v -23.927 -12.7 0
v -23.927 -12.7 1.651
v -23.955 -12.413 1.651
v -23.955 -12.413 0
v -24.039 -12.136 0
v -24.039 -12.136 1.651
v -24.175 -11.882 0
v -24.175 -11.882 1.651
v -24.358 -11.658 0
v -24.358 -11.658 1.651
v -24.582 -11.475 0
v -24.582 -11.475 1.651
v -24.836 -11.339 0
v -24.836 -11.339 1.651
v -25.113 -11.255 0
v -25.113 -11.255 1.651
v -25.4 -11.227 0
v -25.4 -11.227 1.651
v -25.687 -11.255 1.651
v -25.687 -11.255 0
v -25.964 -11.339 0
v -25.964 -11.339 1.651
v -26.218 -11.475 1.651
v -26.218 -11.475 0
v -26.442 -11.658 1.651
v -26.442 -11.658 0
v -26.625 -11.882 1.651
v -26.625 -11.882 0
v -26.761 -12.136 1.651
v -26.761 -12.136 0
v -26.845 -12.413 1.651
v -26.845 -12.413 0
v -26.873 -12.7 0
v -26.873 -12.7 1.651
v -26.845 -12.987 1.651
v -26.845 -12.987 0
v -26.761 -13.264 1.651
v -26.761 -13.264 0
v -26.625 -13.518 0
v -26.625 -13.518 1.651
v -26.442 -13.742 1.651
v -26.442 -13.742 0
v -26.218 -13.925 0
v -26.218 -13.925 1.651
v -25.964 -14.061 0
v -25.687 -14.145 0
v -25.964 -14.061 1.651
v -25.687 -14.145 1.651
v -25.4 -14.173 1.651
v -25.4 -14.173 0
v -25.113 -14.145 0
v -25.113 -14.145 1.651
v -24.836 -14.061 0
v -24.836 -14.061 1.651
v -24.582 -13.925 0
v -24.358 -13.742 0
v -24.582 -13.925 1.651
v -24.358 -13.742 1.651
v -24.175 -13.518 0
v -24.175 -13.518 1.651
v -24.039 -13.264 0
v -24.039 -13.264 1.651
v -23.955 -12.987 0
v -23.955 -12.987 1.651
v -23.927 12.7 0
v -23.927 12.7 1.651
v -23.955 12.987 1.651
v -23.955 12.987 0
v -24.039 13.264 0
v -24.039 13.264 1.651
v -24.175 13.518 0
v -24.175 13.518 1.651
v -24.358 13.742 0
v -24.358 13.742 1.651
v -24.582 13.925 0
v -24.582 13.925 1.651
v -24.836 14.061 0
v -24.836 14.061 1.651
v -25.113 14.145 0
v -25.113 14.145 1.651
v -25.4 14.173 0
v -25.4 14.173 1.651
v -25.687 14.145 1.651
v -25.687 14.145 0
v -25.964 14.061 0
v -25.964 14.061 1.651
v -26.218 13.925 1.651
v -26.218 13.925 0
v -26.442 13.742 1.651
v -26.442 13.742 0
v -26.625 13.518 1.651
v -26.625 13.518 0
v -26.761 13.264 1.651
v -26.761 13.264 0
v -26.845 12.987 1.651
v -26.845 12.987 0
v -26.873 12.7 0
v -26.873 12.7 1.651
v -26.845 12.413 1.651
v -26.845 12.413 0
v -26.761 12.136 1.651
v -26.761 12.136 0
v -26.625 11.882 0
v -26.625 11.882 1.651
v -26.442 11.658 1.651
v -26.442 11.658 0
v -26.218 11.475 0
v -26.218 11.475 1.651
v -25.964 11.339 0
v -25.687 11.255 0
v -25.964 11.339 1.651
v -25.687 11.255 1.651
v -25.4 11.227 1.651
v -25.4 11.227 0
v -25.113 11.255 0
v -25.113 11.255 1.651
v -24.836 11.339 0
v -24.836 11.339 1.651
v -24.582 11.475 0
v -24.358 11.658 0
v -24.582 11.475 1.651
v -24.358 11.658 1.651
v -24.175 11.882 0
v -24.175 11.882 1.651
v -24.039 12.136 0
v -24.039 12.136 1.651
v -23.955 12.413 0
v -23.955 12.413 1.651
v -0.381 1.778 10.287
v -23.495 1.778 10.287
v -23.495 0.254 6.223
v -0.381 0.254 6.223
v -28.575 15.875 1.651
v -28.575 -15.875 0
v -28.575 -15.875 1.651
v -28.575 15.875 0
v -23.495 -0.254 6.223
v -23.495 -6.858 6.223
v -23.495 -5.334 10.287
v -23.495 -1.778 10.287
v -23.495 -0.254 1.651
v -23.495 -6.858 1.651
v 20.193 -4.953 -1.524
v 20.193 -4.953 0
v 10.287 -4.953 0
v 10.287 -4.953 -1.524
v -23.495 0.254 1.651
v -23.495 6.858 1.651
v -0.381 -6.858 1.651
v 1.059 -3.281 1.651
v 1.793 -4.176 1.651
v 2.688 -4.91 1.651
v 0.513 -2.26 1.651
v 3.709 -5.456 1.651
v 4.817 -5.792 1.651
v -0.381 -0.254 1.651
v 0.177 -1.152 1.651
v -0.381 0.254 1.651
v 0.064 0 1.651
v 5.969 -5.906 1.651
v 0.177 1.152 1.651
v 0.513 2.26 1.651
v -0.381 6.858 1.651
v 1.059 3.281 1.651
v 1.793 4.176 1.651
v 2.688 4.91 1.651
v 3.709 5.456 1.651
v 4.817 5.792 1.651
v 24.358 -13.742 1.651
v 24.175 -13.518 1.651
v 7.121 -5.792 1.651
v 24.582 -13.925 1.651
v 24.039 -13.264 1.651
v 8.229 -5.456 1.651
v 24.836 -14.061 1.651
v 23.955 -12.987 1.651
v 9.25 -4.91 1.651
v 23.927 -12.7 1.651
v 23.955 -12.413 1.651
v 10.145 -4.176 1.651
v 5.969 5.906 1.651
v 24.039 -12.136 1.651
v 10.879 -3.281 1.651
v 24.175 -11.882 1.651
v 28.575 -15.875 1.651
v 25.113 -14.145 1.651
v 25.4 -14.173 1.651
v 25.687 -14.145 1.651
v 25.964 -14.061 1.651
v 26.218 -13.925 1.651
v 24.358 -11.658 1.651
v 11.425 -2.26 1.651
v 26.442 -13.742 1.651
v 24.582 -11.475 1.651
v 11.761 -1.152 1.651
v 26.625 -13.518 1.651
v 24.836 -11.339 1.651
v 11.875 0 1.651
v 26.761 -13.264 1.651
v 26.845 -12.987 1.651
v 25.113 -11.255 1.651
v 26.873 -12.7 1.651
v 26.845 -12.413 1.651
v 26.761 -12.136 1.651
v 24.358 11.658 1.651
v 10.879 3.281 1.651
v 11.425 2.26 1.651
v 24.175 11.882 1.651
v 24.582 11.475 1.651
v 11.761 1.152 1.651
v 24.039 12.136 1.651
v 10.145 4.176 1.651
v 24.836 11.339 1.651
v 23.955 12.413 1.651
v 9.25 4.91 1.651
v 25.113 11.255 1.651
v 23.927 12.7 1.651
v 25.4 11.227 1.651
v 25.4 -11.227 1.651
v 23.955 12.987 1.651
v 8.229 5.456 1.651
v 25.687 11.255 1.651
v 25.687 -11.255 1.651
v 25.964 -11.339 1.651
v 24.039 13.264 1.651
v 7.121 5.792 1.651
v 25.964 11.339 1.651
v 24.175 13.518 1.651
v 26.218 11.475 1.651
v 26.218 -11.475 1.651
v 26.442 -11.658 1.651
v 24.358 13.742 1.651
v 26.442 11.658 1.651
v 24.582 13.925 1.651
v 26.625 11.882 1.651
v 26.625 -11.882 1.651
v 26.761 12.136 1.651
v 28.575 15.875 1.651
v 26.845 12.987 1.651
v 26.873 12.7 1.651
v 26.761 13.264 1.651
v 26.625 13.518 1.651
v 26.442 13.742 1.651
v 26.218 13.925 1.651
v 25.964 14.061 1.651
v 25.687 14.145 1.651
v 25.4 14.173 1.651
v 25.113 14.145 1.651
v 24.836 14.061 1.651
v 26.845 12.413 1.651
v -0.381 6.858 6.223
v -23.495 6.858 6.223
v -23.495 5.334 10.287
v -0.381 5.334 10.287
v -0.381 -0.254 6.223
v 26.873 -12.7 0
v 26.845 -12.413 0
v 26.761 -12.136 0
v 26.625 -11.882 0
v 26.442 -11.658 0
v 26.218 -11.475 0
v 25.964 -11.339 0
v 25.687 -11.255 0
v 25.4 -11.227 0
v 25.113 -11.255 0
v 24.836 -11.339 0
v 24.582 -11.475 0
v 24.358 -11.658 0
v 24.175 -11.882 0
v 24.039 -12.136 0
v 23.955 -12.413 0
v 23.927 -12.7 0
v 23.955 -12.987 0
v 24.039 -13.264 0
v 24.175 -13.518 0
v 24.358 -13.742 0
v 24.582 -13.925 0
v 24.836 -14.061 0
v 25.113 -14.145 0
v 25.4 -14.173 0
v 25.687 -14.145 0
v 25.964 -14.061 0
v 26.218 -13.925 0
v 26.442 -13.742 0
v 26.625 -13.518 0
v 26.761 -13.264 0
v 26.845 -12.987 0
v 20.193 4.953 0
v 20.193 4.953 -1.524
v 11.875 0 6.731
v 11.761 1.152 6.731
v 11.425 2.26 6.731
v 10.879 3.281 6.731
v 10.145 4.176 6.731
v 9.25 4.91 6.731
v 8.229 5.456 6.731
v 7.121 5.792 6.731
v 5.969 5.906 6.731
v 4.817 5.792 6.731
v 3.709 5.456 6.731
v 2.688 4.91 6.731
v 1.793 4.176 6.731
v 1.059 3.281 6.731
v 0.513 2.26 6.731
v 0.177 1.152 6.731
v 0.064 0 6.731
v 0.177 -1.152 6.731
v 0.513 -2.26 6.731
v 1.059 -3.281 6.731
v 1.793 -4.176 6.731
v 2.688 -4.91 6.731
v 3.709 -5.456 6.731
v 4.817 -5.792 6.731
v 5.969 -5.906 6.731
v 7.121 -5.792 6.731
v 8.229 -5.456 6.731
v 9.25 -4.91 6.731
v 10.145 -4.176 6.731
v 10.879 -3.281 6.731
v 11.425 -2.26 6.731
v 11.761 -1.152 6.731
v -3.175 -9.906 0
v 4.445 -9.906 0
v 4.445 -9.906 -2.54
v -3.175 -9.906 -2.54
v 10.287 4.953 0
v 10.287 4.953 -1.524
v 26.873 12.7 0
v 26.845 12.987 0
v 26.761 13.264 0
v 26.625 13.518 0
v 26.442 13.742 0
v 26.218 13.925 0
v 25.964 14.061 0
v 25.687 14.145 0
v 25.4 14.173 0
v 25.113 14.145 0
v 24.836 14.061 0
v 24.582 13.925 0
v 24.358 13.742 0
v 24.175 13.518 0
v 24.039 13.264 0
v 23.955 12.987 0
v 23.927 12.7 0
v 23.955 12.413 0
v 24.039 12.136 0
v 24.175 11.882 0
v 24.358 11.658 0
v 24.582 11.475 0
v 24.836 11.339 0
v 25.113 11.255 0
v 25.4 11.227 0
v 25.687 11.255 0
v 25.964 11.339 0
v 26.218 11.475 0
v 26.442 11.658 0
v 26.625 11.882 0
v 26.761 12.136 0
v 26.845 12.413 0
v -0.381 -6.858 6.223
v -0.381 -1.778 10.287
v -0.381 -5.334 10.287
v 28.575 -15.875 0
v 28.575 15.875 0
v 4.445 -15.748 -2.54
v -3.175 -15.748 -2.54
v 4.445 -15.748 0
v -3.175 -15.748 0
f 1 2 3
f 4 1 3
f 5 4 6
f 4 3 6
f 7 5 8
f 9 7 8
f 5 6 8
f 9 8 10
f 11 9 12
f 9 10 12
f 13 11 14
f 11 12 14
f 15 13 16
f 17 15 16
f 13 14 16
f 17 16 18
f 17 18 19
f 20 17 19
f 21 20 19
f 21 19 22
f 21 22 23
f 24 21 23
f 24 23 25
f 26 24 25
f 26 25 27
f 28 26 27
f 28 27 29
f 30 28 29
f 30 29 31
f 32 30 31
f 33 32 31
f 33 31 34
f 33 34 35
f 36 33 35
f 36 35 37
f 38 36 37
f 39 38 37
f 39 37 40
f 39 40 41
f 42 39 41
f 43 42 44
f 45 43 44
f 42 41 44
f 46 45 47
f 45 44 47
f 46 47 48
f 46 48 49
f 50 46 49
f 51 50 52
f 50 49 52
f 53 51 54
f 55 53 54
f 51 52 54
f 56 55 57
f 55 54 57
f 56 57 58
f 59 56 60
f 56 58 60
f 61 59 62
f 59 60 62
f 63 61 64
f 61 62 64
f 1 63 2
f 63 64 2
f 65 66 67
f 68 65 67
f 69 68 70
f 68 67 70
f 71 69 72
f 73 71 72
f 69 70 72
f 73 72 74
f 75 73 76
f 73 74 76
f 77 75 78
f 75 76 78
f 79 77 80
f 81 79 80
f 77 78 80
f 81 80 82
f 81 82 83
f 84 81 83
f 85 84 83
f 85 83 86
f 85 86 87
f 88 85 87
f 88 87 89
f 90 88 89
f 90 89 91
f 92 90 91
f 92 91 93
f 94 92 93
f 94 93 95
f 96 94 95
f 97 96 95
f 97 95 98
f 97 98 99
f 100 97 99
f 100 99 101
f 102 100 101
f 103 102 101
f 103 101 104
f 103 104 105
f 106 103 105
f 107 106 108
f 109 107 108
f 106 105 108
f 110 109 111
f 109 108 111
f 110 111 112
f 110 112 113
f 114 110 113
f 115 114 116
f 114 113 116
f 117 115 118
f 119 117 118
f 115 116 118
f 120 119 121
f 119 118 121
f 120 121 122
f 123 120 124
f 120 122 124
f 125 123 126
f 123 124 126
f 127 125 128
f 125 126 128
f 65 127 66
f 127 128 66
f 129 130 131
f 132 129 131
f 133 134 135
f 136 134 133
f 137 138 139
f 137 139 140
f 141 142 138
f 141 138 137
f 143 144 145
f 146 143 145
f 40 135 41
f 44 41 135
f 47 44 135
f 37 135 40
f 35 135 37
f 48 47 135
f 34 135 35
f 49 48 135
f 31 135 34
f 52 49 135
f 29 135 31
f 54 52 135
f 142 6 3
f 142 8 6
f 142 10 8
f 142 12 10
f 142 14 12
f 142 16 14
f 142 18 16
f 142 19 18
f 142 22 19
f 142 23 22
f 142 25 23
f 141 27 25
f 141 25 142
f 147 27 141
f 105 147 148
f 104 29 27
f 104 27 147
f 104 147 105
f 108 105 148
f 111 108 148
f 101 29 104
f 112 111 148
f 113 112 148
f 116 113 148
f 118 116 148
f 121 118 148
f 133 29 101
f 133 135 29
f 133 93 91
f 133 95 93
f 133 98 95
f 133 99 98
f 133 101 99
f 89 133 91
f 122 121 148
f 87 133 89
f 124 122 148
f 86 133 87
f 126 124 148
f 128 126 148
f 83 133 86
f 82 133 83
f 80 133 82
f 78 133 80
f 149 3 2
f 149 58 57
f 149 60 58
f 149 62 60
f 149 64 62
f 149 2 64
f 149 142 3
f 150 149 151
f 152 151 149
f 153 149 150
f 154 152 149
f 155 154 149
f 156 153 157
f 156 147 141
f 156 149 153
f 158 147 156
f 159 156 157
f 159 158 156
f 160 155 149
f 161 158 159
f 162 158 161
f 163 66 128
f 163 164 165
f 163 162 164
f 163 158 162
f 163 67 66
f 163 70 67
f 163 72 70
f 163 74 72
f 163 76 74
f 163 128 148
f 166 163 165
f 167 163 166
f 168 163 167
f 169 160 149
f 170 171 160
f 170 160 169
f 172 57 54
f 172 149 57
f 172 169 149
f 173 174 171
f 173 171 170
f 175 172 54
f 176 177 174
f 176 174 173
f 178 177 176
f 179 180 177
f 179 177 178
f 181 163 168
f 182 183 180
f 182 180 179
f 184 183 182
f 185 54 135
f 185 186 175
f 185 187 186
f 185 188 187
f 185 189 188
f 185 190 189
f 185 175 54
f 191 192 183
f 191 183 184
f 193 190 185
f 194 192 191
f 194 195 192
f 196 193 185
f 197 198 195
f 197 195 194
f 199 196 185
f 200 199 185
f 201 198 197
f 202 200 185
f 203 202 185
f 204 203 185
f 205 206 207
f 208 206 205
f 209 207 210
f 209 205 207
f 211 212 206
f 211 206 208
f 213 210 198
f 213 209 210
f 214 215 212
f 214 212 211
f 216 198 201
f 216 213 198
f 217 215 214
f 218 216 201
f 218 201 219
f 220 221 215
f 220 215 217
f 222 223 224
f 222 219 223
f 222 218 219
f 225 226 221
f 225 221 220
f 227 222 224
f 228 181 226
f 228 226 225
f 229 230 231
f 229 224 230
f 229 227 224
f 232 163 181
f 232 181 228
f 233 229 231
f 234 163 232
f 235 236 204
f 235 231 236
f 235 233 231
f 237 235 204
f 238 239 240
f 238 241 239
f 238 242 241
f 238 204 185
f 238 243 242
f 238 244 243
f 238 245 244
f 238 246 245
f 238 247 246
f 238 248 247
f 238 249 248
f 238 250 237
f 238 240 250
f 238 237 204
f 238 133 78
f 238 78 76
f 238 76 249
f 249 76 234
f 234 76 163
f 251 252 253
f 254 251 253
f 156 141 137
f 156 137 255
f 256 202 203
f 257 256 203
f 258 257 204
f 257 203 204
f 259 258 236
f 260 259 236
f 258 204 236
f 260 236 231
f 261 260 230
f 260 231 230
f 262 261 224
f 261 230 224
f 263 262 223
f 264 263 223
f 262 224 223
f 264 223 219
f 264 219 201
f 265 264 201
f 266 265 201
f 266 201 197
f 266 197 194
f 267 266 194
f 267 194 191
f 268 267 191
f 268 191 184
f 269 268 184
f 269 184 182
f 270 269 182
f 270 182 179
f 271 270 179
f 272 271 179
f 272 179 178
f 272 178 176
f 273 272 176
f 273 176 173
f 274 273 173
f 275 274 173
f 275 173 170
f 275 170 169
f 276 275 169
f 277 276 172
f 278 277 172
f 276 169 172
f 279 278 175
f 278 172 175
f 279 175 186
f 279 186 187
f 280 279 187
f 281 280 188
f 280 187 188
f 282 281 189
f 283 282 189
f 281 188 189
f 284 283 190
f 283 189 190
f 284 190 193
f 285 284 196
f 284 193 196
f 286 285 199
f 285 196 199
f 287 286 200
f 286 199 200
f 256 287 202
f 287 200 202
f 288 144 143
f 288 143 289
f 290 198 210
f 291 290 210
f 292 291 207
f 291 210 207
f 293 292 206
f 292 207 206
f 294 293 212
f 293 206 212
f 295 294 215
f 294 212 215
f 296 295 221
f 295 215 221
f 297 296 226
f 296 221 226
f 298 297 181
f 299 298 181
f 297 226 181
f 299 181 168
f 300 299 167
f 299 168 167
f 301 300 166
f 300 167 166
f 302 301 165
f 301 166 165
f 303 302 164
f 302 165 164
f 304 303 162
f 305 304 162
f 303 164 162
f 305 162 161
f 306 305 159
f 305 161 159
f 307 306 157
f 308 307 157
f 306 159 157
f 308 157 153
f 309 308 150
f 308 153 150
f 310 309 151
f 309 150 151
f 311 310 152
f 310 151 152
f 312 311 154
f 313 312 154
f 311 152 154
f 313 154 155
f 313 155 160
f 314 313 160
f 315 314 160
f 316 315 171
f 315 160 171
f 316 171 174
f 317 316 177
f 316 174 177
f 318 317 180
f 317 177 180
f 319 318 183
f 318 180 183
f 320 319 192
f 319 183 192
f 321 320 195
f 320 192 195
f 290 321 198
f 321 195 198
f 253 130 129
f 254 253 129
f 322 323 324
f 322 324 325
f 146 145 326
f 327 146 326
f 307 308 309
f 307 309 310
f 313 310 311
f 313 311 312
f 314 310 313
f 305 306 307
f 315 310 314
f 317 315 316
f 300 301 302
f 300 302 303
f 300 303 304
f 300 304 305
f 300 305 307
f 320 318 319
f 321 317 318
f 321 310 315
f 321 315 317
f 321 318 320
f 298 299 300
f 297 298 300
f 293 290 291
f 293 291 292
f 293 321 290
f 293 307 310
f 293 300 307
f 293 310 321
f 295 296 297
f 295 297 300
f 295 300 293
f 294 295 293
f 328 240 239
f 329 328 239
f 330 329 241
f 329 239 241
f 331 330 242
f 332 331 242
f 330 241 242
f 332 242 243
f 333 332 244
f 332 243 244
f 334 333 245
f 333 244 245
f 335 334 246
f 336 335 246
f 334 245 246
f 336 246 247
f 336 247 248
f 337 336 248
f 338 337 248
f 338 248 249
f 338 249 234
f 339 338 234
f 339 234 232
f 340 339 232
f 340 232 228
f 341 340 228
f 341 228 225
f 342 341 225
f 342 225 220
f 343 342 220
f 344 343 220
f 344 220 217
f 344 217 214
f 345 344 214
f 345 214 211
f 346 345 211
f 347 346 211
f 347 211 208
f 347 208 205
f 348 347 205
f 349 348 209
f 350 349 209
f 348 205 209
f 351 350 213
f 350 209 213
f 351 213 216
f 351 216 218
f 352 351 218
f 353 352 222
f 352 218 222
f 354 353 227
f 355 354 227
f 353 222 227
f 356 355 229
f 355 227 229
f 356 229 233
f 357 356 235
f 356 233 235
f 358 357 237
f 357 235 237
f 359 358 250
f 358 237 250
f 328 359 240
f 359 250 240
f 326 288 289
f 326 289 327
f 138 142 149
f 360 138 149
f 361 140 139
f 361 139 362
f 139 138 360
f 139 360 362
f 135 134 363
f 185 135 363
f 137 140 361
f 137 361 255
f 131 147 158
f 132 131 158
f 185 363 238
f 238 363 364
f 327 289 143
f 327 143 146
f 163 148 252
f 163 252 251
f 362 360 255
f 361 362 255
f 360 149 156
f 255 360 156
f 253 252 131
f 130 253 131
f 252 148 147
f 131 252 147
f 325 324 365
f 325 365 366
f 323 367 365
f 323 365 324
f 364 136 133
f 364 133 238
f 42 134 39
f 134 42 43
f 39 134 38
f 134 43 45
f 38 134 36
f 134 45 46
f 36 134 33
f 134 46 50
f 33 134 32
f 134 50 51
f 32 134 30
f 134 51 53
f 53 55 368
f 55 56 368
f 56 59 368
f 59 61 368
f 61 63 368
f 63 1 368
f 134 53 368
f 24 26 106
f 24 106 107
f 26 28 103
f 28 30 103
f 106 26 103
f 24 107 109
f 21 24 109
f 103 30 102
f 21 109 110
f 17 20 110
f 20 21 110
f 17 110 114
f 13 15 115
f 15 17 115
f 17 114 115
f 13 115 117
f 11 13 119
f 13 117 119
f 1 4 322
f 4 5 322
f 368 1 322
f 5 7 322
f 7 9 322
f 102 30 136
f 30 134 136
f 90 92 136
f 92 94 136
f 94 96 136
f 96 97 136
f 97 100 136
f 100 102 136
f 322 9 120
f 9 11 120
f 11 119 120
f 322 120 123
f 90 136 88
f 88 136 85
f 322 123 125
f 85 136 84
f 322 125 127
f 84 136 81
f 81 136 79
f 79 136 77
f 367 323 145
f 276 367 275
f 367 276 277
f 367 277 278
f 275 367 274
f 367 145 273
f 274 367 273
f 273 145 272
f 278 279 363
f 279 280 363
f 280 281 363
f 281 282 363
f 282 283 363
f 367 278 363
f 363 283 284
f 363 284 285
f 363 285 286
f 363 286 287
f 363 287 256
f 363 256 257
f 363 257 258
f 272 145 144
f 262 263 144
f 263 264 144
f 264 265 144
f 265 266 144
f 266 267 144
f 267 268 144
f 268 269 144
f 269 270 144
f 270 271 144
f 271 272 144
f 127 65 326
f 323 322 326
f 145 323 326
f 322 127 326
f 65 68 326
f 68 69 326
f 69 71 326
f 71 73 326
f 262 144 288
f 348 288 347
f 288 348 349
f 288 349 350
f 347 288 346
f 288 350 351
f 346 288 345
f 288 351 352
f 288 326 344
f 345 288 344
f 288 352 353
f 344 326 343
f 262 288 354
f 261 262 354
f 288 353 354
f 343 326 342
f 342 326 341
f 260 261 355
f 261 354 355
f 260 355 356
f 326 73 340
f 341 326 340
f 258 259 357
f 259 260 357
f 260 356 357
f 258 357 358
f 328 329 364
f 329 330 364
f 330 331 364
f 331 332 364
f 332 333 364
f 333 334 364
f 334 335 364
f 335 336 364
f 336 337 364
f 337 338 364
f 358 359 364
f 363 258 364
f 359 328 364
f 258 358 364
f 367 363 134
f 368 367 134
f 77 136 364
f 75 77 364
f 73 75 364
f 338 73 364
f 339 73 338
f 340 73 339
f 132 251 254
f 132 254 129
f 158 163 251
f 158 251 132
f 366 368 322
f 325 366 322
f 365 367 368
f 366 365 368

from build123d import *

# Parameters (mm, degrees)
SKETCH1_W               = 57.15
SKETCH1_H               = 31.75
BOSS_EXTRUDE1_DEPTH     = 1.651
SKETCH2_R               = 1.4732
MOUNT_HOLES_DEPTH       = 2.651
SKETCH3_W               = 23.114
SKETCH3_H               = 6.604
BOSS_EXTRUDE2_DEPTH     = 8.636
CUT_EXTRUDE1_DEPTH      = 23.114
SKETCH5_W               = 9.906
SKETCH5_H               = 9.906
LARGE_BOTTOM_CHIP_DEPTH = 1.524
SKETCH8_R               = 5.9055
BUZZER_DEPTH            = 5.08
SKETCH9_W               = 7.62
SKETCH9_H               = 5.842
USB_CONNECTOR_DEPTH     = 2.54


with BuildPart() as part:
    # Sketch1 → Boss-Extrude1 (new body)
    with BuildSketch(Plane.XY):
        Rectangle(SKETCH1_W, SKETCH1_H)
    extrude(amount=BOSS_EXTRUDE1_DEPTH)

    # Sketch2 → Mount-Holes (cut, through all)
    with BuildSketch(Plane.XY.offset(1.651)):
        with Locations((25.4, -12.7)):
            Circle(SKETCH2_R)
        with Locations((25.4, 12.7)):
            Circle(SKETCH2_R)
        with Locations((-25.4, 12.7)):
            Circle(SKETCH2_R)
        with Locations((-25.4, -12.7)):
            Circle(SKETCH2_R)
    extrude(amount=-MOUNT_HOLES_DEPTH, mode=Mode.SUBTRACT)

    # Sketch3 → Boss-Extrude2 (add)
    with BuildSketch(Plane.XY.offset(1.651)):
        with Locations((-11.938, -3.556)):
            Rectangle(SKETCH3_W, SKETCH3_H)
    boss_extrude2 = extrude(amount=BOSS_EXTRUDE2_DEPTH)

    # Sketch4 → Cut-Extrude1 (cut)
    with BuildSketch(Plane.ZY.offset(23.495)):
        Polygon((6.223, -6.858), (10.287, -5.334), (10.287, -6.858), align=None)
        Polygon((10.287, -0.254), (10.287, -1.778), (6.223, -0.254), align=None)
    cut_extrude1 = extrude(amount=-CUT_EXTRUDE1_DEPTH, mode=Mode.SUBTRACT)

    # Mirror1: Boss-Extrude2, Cut-Extrude1 across plane
    add(boss_extrude2.mirror(Plane.ZX))
    add(cut_extrude1.mirror(Plane.ZX), mode=Mode.SUBTRACT)

    # Sketch5 → Large bottom chip (add)
    with BuildSketch(Plane(origin=(0, 0, 0), x_dir=(-1, 0, 0), z_dir=(0, 0, -1))):
        with Locations((-15.24, 0)):
            Rectangle(SKETCH5_W, SKETCH5_H)
    extrude(amount=LARGE_BOTTOM_CHIP_DEPTH)

    # Sketch8 → Buzzer (add)
    with BuildSketch(Plane.XY.offset(1.651)):
        with Locations((5.969, 0)):
            Circle(SKETCH8_R)
    extrude(amount=BUZZER_DEPTH)

    # Sketch9 → USB Connector (add)
    with BuildSketch(Plane(origin=(0, 0, 0), x_dir=(-1, 0, 0), z_dir=(0, 0, -1))):
        with Locations((-0.635, -12.827)):
            Rectangle(SKETCH9_W, SKETCH9_H)
    extrude(amount=USB_CONNECTOR_DEPTH)


solid = part.part
